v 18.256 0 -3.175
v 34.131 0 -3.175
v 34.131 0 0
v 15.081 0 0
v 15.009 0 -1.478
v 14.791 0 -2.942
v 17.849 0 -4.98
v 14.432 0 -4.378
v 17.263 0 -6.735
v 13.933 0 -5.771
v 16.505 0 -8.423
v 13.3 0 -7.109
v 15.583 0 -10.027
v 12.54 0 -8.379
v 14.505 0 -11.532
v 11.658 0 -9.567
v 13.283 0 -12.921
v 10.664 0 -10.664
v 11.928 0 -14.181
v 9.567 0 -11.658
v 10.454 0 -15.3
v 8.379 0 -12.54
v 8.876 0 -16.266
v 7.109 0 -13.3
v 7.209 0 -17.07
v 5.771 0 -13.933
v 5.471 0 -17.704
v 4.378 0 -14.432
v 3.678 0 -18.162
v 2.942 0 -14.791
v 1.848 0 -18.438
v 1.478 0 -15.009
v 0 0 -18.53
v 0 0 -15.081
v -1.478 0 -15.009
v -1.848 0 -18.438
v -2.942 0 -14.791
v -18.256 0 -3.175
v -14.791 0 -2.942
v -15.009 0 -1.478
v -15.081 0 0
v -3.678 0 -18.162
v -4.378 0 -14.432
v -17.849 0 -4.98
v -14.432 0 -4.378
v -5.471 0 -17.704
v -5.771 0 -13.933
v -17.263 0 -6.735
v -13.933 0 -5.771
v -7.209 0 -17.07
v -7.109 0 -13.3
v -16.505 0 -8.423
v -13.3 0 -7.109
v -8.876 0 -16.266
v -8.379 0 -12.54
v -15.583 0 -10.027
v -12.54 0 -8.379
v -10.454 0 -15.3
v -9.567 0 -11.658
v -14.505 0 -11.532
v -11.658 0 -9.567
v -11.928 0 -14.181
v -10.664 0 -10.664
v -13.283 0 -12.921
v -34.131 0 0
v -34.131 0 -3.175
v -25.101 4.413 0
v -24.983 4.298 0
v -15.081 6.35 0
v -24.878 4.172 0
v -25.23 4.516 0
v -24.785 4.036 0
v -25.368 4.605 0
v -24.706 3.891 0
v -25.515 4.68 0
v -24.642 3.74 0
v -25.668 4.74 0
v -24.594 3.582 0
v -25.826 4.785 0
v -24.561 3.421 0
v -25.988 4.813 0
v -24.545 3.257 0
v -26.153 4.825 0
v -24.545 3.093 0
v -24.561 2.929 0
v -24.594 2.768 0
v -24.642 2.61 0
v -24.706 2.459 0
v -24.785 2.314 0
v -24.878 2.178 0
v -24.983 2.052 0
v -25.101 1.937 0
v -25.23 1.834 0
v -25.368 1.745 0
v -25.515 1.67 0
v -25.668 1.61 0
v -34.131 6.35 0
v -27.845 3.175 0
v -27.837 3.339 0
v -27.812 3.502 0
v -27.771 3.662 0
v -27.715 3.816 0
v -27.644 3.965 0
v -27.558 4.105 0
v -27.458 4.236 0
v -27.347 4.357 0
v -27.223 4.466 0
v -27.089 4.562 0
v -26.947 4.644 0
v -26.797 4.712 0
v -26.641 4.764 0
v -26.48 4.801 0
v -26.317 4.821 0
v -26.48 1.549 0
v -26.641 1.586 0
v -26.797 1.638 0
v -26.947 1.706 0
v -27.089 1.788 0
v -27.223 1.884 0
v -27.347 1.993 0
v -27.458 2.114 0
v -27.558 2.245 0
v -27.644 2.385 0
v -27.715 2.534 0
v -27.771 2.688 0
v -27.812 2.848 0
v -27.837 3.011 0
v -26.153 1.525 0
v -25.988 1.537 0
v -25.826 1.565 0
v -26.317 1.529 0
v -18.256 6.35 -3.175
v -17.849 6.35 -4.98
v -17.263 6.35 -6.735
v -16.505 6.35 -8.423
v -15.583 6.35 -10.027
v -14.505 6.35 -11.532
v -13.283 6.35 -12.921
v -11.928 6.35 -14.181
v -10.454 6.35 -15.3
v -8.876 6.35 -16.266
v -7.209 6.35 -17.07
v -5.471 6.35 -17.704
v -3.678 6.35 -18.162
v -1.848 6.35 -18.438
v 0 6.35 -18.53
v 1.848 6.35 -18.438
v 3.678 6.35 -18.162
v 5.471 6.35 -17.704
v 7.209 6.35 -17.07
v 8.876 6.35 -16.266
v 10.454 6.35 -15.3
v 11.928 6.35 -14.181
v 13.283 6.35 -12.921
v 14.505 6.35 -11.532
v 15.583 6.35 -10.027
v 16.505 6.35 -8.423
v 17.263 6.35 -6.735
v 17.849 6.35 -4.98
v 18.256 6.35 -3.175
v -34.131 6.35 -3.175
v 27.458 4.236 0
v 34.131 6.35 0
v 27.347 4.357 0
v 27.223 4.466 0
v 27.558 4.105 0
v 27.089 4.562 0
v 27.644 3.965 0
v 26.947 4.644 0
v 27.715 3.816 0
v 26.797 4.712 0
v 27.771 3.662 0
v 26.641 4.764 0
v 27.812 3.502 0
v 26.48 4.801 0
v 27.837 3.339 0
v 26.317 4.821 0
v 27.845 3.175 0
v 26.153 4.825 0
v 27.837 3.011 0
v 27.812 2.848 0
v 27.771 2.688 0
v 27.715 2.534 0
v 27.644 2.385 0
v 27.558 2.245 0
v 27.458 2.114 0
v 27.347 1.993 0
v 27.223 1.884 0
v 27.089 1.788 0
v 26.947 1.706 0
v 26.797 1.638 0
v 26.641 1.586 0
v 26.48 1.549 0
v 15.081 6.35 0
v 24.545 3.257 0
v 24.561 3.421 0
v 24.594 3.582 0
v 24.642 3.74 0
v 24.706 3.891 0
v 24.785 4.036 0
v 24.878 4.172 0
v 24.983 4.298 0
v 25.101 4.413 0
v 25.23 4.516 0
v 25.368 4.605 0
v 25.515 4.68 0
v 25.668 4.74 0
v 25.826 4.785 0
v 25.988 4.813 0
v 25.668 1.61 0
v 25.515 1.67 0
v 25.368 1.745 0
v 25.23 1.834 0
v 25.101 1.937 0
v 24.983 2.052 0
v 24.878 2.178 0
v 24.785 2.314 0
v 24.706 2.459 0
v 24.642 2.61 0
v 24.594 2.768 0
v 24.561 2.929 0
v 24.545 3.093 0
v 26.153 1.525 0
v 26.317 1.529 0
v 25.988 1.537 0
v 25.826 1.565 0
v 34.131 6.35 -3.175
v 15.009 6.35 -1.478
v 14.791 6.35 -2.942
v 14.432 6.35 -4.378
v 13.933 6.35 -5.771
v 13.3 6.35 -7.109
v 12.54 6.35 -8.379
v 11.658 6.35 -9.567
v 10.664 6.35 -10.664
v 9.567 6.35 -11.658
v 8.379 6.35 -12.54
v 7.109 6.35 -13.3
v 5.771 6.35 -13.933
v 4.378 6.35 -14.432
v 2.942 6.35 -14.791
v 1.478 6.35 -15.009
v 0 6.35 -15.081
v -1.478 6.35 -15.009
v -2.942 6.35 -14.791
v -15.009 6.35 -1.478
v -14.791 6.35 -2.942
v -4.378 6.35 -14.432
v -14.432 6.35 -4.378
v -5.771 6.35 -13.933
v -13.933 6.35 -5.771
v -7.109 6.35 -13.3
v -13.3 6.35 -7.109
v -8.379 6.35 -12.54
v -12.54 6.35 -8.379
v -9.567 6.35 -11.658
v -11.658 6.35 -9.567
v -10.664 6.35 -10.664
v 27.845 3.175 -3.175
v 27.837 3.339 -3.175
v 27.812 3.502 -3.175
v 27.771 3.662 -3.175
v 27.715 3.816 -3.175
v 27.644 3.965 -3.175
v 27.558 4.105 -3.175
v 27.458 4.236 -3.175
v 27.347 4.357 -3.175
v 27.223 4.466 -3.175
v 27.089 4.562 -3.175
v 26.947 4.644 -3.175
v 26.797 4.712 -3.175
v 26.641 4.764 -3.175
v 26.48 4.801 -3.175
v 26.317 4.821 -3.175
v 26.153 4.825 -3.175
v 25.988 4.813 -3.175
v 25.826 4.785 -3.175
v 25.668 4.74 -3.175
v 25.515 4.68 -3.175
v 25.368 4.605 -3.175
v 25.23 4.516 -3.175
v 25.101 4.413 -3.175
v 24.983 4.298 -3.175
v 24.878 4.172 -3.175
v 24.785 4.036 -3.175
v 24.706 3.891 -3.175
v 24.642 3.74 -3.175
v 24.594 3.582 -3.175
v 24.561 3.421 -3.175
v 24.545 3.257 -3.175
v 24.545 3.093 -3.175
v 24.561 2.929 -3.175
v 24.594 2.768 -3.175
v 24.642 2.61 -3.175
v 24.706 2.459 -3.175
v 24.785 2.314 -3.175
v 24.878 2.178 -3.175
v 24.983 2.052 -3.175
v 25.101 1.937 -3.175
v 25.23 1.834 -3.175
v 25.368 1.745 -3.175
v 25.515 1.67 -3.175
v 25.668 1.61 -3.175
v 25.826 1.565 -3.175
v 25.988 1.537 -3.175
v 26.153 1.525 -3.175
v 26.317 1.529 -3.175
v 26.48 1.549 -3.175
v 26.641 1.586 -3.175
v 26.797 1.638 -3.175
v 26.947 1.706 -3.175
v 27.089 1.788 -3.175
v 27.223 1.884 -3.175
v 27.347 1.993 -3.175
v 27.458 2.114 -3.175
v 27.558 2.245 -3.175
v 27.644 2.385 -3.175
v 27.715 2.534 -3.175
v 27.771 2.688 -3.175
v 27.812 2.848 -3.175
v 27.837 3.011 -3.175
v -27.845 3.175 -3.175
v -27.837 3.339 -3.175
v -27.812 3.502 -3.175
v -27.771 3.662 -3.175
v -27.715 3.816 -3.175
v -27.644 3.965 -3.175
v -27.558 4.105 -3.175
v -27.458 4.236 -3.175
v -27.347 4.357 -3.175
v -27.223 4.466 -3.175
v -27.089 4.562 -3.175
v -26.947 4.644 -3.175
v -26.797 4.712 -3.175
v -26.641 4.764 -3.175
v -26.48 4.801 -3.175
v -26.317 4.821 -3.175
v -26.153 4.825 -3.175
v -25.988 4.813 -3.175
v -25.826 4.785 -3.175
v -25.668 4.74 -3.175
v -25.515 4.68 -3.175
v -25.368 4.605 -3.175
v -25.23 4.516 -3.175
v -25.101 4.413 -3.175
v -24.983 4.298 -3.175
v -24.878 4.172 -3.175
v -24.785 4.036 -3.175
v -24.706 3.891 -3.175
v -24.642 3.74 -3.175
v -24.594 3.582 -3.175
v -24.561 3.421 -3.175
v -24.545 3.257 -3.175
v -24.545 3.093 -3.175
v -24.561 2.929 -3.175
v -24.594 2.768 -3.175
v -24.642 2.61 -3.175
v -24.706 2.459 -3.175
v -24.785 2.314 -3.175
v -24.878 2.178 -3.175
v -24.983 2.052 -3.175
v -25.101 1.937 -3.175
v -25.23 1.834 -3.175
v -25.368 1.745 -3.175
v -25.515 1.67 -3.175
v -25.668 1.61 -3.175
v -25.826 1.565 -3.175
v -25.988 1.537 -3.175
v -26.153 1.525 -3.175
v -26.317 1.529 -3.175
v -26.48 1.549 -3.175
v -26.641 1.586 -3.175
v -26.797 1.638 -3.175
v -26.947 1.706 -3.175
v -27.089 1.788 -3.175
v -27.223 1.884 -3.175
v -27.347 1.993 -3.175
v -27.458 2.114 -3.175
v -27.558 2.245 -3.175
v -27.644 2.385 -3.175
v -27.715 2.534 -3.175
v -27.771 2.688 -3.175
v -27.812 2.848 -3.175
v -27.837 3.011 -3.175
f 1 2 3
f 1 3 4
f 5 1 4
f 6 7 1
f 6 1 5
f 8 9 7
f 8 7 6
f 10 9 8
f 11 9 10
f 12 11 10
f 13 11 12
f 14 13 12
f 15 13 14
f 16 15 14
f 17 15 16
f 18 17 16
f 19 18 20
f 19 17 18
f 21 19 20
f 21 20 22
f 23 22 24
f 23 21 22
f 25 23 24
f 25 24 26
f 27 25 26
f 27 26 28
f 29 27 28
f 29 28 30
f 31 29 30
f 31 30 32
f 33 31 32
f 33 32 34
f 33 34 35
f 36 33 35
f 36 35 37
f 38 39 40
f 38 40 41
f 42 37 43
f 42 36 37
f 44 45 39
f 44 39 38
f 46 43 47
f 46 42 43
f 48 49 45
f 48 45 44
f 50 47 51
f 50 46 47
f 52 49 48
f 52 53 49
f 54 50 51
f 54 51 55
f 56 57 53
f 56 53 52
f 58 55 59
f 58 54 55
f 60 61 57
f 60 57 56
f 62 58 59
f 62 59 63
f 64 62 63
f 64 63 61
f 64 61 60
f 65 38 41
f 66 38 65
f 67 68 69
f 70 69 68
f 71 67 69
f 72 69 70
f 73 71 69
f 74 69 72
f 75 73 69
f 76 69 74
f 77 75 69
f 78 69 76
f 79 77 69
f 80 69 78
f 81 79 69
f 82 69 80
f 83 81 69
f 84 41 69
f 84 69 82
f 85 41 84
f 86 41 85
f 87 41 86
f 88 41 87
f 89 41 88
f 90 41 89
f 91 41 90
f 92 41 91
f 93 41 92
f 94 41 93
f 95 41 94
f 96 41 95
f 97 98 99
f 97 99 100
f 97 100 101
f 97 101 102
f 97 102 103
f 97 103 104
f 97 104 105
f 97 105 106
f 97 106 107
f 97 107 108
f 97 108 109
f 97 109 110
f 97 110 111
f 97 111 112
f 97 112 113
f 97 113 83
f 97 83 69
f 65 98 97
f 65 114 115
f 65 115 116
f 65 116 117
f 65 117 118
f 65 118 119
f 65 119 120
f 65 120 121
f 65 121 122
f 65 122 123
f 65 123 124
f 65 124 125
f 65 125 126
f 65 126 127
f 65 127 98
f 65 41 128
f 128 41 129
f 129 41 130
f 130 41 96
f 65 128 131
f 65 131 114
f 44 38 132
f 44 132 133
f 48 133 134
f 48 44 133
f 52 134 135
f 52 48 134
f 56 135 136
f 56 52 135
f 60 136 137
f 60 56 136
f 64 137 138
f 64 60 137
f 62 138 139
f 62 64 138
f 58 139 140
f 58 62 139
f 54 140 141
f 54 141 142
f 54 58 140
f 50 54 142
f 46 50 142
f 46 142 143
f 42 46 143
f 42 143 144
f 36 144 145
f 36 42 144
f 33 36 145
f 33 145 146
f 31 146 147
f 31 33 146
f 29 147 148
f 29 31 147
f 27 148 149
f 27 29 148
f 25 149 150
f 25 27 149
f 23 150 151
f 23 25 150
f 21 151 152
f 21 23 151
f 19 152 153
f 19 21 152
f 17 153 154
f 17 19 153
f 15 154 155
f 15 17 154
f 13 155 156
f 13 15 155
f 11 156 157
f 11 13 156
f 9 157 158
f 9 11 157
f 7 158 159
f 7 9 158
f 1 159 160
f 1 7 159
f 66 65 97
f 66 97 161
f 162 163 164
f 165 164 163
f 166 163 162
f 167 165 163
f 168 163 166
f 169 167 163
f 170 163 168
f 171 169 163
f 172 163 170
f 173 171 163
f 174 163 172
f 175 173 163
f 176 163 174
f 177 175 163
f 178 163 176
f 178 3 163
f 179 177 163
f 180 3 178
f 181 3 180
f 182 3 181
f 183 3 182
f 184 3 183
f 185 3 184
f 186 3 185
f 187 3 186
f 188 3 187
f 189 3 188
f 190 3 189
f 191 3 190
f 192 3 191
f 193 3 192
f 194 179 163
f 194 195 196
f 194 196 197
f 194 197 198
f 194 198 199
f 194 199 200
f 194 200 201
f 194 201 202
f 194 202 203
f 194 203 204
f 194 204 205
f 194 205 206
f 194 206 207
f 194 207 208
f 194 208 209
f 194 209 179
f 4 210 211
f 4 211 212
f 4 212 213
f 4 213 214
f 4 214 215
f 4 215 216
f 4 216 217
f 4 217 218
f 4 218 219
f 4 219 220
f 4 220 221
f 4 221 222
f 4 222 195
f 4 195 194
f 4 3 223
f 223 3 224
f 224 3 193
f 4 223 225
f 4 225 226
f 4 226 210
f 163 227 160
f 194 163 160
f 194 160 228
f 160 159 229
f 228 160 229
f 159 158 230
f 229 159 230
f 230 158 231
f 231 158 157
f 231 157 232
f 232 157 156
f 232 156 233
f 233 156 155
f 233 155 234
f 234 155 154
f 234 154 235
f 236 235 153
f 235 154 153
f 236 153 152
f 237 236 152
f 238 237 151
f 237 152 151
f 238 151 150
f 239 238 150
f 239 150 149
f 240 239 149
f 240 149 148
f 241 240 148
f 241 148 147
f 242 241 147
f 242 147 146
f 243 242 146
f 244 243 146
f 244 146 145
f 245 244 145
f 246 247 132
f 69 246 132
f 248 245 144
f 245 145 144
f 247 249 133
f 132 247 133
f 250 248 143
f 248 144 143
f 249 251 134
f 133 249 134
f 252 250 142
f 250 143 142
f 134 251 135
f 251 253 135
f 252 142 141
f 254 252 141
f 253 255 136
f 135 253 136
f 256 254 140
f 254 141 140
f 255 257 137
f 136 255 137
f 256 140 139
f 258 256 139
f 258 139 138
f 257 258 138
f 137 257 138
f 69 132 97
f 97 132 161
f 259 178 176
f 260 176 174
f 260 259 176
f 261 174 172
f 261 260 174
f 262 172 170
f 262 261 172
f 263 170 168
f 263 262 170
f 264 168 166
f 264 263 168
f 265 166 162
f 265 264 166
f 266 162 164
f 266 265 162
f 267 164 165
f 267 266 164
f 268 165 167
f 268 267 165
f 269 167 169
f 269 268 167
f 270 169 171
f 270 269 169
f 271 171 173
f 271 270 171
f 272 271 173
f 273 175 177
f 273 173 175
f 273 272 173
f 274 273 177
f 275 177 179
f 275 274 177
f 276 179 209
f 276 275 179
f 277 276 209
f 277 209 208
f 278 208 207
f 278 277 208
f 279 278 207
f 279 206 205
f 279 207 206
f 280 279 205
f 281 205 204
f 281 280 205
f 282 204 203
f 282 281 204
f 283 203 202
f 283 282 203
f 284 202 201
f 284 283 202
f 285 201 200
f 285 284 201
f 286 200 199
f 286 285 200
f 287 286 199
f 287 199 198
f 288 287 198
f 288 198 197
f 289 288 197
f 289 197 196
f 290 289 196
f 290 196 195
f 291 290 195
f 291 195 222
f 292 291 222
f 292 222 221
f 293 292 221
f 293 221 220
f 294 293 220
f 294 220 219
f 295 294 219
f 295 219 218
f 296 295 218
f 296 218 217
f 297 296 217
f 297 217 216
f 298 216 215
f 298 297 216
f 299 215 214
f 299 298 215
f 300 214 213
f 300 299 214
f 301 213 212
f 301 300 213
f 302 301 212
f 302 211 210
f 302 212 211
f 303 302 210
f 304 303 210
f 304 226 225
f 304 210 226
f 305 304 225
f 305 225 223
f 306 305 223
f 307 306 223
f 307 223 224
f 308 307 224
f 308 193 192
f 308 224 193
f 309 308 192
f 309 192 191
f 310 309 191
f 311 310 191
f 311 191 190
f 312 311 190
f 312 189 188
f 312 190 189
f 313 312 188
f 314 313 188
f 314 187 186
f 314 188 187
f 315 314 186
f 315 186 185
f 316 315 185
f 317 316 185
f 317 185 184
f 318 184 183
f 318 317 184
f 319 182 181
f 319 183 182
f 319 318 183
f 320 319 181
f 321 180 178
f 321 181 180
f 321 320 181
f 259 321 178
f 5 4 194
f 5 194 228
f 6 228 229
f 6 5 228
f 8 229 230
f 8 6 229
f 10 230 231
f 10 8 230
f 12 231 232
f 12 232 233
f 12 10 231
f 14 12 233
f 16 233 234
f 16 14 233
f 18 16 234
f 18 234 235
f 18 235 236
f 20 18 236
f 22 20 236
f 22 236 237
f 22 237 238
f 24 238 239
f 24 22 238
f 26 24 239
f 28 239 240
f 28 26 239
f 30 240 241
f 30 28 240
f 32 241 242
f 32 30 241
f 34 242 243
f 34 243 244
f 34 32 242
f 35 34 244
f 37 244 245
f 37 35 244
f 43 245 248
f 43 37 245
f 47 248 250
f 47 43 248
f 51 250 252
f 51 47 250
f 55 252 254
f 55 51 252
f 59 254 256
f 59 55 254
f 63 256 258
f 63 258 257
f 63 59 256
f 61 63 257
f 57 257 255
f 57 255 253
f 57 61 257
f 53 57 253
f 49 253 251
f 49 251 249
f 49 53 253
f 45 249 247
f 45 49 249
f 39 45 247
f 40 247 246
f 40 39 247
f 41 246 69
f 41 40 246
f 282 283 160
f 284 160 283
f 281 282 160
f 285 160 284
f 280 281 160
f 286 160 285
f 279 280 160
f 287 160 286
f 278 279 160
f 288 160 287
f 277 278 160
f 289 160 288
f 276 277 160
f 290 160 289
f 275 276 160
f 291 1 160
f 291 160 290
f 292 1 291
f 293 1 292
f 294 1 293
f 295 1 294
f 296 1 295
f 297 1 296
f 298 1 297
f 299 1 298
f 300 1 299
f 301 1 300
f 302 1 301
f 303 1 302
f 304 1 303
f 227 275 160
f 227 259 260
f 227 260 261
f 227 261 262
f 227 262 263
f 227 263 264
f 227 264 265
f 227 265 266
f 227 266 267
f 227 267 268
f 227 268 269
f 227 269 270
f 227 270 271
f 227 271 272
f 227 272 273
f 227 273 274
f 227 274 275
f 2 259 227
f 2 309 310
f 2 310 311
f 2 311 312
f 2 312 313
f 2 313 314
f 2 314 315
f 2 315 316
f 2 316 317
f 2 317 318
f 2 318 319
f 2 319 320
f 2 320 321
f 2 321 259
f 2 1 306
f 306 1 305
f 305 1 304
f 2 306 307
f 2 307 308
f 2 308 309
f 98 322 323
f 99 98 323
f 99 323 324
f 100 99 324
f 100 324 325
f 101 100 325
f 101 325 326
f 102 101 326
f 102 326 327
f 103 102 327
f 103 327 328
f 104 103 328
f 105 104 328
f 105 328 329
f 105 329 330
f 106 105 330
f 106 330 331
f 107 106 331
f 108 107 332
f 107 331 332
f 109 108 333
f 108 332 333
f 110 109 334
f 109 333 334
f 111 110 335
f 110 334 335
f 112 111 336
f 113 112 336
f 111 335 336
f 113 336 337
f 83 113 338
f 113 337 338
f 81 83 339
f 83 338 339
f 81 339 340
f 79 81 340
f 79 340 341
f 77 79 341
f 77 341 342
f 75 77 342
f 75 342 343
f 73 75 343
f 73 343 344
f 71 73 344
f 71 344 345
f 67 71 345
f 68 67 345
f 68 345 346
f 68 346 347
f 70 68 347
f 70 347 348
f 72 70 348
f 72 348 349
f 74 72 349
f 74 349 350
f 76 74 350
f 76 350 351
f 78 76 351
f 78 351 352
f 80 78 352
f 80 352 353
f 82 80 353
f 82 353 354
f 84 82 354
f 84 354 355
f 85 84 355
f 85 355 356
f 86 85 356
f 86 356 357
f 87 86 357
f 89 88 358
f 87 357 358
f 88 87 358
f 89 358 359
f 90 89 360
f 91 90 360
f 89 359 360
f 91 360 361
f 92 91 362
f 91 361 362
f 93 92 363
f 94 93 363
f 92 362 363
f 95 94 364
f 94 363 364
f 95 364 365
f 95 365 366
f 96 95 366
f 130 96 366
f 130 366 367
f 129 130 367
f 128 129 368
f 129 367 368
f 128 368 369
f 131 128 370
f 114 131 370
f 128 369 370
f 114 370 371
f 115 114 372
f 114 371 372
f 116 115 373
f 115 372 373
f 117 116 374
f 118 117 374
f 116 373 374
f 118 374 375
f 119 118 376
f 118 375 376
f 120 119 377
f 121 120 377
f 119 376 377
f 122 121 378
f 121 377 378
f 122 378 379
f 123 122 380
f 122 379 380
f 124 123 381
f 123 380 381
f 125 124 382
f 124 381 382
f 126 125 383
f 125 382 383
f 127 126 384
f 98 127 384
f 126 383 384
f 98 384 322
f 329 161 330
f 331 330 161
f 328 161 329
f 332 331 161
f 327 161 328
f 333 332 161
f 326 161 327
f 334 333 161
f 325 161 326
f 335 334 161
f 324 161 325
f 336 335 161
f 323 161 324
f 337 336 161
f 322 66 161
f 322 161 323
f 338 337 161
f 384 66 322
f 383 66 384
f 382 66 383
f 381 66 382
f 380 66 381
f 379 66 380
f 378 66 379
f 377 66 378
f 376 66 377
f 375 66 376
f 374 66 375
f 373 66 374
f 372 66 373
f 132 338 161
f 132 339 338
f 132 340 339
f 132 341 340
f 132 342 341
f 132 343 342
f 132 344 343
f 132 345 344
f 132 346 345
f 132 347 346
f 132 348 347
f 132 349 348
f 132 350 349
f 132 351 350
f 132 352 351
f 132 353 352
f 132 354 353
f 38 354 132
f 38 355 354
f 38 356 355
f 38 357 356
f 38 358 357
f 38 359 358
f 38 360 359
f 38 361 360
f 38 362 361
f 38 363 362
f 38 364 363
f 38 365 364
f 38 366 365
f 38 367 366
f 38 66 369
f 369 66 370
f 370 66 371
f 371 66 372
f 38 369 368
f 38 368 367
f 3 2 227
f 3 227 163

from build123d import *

# Parameters (mm, degrees)
BOSS_EXTRUDE1_DEPTH = 6.35
SKETCH2_R           = 1.651
CUT_EXTRUDE1_DEPTH  = 6.35


with BuildPart() as part:
    # Sketch1 → Boss-Extrude1 (new body)
    with BuildSketch(Plane(origin=(0, 0, 0), x_dir=(1, 0, 0), z_dir=(0, 1, 0))):
        with BuildLine():
            Line((-15.08125, 0), (-34.13125, 0))
            Line((-34.13125, 0), (-34.13125, 3.175))
            Line((-34.13125, 3.175), (-18.25625, 3.175))
            ThreePointArc((-18.25625, 3.175), (0, 18.530280329), (18.25625, 3.175))
            Line((18.25625, 3.175), (34.13125, 3.175))
            Line((34.13125, 3.175), (34.13125, 0))
            Line((34.13125, 0), (15.08125, 0))
            ThreePointArc((15.08125, 0), (0, 15.08125), (-15.08125, 0))
        make_face()
    extrude(amount=BOSS_EXTRUDE1_DEPTH)

    # Sketch2 → Cut-Extrude1 (cut)
    with BuildSketch(Plane(origin=(0, 0, -3.175), x_dir=(-1, 0, 0), z_dir=(0, 0, -1))):
        with Locations((26.19375, 3.175)):
            Circle(SKETCH2_R)
    cut_extrude1 = extrude(amount=-CUT_EXTRUDE1_DEPTH, mode=Mode.SUBTRACT)

    # Mirror1: Cut-Extrude1 across plane
    add(cut_extrude1.mirror(Plane(origin=(0, 0, 0), x_dir=(0, 0, 1), z_dir=(1, 0, 0))), mode=Mode.SUBTRACT)


solid = part.part
